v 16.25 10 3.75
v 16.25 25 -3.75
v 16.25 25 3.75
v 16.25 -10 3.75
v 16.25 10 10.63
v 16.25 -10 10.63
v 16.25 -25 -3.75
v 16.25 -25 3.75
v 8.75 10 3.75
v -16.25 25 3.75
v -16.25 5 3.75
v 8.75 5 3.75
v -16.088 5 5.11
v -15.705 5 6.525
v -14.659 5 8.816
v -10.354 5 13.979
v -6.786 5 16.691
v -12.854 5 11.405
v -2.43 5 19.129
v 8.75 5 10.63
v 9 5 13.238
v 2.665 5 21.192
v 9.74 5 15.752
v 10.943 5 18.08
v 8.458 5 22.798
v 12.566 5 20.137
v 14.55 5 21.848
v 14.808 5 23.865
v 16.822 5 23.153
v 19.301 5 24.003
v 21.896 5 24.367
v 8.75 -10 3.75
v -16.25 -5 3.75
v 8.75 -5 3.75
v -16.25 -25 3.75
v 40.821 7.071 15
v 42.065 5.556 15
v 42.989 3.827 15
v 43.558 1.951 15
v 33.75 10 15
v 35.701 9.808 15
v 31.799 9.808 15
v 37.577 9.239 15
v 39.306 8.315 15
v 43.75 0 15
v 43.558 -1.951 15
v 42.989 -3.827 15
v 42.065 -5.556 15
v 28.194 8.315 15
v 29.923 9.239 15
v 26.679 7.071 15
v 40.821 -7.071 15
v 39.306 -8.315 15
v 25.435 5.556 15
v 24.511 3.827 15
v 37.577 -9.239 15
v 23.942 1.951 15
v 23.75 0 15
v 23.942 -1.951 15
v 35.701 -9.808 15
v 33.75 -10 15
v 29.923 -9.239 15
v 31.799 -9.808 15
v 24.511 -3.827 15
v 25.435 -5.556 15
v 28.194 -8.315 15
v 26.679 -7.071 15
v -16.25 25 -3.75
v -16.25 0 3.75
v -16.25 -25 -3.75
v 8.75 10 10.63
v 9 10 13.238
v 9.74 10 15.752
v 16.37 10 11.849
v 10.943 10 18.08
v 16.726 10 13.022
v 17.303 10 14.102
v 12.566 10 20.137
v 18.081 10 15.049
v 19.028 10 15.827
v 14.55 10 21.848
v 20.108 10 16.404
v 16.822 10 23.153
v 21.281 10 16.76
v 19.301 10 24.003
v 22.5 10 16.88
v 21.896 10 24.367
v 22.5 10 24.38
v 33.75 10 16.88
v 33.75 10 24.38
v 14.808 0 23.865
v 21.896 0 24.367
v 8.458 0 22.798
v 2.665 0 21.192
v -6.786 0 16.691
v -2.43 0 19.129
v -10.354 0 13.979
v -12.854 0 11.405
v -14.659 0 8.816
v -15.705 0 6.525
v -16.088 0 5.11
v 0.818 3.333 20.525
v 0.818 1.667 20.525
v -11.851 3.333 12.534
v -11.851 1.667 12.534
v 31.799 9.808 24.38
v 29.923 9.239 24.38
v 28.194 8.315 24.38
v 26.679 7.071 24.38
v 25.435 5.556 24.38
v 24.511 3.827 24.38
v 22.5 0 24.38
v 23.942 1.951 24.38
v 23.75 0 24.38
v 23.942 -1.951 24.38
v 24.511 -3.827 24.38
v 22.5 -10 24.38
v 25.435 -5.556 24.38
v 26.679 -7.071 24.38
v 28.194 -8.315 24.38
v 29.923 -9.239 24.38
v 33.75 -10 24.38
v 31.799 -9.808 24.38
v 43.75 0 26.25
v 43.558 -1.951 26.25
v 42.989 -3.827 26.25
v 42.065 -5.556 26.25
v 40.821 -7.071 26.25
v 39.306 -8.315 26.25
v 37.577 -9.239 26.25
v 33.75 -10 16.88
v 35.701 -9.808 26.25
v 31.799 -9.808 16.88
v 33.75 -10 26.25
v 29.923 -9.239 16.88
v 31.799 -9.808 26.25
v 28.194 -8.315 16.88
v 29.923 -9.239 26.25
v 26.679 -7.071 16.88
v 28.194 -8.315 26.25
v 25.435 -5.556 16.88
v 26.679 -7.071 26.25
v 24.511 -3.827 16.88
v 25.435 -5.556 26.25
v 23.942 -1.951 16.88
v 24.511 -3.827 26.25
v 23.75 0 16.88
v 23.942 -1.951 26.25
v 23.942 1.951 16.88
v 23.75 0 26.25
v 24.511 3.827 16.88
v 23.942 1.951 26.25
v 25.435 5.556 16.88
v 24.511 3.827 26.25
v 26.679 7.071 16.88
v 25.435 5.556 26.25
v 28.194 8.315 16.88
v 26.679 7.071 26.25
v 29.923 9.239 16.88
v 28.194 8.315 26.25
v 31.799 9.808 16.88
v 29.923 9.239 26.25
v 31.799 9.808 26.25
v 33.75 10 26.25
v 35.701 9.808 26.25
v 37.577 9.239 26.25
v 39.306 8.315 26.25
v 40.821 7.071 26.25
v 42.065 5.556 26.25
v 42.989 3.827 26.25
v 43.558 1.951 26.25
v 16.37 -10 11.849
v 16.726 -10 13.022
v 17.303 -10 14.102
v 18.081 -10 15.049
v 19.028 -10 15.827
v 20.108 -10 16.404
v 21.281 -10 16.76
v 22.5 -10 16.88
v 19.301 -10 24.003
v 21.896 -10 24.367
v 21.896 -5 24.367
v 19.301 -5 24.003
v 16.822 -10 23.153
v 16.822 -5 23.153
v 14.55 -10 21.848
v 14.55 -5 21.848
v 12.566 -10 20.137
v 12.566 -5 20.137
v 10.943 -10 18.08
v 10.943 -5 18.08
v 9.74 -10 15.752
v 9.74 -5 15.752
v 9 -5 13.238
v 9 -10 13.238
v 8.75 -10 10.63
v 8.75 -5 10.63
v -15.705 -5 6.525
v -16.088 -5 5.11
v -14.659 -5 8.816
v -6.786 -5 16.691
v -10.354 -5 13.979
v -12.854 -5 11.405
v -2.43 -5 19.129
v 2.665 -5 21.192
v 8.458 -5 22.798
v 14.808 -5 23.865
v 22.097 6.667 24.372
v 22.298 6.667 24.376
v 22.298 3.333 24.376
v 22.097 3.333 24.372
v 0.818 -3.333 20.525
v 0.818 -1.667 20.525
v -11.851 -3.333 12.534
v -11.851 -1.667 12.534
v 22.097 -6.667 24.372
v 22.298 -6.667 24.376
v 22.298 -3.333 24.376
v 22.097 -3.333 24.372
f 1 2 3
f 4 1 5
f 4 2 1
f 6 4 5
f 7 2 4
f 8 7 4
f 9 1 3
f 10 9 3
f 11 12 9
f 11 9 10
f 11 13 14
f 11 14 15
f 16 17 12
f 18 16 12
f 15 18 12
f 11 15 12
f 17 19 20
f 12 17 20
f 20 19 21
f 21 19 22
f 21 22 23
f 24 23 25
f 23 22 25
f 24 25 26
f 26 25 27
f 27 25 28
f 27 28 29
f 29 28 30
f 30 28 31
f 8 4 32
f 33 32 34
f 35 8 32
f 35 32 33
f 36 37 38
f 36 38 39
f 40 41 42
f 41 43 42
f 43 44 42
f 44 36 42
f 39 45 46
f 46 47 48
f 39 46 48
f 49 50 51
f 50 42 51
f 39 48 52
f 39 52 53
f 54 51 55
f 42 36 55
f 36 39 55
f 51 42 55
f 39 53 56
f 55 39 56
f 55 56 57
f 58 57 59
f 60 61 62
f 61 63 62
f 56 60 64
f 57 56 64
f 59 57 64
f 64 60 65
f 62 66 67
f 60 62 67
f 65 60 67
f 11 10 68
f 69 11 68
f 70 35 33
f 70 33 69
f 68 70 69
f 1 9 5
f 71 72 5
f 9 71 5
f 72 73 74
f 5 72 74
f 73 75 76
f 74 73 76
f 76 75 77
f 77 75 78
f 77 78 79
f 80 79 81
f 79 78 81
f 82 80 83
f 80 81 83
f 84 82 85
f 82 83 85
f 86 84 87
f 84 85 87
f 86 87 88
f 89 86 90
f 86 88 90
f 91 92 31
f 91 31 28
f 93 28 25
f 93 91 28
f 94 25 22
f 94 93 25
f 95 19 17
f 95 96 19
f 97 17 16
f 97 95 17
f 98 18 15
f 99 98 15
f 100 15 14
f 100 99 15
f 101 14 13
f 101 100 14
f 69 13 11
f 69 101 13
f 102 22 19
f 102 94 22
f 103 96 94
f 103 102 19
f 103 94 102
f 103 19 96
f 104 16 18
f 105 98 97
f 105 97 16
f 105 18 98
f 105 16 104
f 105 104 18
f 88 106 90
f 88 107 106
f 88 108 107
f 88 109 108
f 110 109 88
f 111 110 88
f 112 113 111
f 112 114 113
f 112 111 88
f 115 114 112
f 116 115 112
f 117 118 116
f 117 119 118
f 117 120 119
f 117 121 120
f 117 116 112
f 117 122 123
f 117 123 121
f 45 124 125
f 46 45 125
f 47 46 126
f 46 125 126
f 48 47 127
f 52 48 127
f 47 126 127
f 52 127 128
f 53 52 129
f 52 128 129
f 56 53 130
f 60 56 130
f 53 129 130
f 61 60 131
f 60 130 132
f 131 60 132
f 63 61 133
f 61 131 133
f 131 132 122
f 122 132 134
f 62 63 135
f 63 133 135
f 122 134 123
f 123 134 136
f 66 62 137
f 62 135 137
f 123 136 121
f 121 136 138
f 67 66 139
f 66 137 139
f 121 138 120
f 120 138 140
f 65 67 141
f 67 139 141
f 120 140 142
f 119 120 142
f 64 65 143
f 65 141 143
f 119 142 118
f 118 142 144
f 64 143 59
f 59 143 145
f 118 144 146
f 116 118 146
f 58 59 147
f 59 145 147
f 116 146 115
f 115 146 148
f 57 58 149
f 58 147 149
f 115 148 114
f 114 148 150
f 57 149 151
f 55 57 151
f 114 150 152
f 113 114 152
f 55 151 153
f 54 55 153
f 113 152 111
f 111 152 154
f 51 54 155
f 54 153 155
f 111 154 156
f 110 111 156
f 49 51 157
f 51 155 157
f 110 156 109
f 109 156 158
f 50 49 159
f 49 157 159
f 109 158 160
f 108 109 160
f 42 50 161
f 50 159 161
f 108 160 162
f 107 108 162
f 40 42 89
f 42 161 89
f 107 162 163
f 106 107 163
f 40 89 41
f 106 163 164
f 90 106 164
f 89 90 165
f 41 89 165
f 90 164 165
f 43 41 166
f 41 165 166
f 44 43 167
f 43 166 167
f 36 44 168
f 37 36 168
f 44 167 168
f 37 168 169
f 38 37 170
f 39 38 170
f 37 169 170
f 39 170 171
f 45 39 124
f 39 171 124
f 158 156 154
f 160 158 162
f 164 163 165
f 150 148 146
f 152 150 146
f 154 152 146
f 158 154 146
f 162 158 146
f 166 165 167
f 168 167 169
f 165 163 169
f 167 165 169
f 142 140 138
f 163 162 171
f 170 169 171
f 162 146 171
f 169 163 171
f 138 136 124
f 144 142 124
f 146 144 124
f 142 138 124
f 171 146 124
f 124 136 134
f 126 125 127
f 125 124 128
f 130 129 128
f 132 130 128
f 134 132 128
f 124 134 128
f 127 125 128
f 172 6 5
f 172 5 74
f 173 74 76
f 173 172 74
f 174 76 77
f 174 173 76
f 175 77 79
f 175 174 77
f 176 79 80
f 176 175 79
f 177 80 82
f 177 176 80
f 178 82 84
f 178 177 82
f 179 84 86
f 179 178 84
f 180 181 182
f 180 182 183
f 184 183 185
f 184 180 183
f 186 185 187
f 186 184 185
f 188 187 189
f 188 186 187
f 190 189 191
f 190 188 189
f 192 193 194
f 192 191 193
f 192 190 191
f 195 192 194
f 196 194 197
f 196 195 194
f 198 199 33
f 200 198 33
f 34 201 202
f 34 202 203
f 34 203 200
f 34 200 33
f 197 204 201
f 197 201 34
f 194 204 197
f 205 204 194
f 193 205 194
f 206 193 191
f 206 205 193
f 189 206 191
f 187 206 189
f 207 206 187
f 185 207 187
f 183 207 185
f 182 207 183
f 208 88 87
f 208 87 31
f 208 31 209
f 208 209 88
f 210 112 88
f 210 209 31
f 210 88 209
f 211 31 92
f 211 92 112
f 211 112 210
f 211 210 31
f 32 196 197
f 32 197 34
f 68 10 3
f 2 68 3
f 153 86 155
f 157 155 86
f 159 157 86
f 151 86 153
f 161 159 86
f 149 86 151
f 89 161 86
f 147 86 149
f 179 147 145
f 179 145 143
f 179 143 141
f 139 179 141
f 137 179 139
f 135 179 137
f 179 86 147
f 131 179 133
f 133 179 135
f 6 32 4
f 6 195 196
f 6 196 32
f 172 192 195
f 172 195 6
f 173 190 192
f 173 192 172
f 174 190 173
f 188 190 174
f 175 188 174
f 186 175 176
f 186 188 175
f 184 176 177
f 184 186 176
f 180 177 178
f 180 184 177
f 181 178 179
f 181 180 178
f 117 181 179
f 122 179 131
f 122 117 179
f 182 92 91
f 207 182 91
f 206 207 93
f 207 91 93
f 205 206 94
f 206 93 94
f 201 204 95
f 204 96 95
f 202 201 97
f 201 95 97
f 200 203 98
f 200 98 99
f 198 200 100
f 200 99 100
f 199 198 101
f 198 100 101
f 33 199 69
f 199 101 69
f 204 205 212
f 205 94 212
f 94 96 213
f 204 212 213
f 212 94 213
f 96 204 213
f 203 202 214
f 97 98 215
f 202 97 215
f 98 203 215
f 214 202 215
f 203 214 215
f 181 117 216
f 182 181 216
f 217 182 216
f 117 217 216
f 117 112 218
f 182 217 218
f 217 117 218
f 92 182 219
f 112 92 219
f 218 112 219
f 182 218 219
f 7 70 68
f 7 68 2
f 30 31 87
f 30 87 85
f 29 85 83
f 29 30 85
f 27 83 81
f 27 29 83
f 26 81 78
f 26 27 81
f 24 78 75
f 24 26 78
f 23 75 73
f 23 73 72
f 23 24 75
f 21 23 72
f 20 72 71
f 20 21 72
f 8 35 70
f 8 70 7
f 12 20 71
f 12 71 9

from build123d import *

# Parameters (mm, degrees)
F1_DEPTH = 25
F2_DEPTH = 5
F0_W     = 10
F0_H     = 7.5000003082
F3_DEPTH = 10


with BuildPart() as f1:
    # F0 (on Front) → F1 (new body, symmetric)
    with BuildSketch(Plane.XZ):
        Polygon((-16.25, 3.75), (-16.25, -3.75), (16.25, -3.75), (16.25, 3.75), (8.7499996918, 3.75), align=None)
    extrude(amount=F1_DEPTH, both=True)

    # F0 (on Front) → F2 (join, symmetric)
    with BuildSketch(Plane.XZ):
        with BuildLine():
            add(Edge.make_bspline(
                [(21.8955707276, 24.3667089847), (-3.4341610337, 23.7179701403), (-15.9380340583, 11.8111578561), (-16.25, 3.75)],
                knots=[0.3450535136, 0.3450535136, 0.3450535136, 0.3450535136, 43.8994238312, 43.8994238312, 43.8994238312, 43.8994238312], degree=3))
            Line((-16.25, 3.75), (8.7499996918, 3.75))
            Line((8.7499996918, 3.75), (8.7499996918, 10.63))
            ThreePointArc((8.7499996918, 10.63), (12.5658817413, 20.1366188993), (21.8955707276, 24.3667089847))
        make_face()
    extrude(amount=F2_DEPTH, both=True)

    # F0 (on Front) → F3 (join, symmetric)
    with BuildSketch(Plane.XZ):
        with BuildLine():
            Line((8.7499996918, 3.75), (16.25, 3.75))
            Line((16.25, 3.75), (16.25, 10.63))
            ThreePointArc((16.25, 10.63), (18.0805826176, 15.0494173824), (22.5, 16.88))
            Line((22.5, 16.88), (23.75, 16.88))
            Line((23.75, 16.88), (23.75, 24.3800003082))
            Line((23.75, 24.3800003082), (22.5, 24.3800003082))
            add(Edge.make_bspline(
                [(22.5, 24.3800003082), (22.2977183657, 24.3762814735), (22.0962420467, 24.371848529), (21.8955707276, 24.3667089847)],
                knots=[0, 0, 0, 0, 0.3450535136, 0.3450535136, 0.3450535136, 0.3450535136], degree=3))
            ThreePointArc((21.8955707276, 24.3667089847), (12.5658817413, 20.1366188993), (8.7499996918, 10.63))
            Line((8.7499996918, 10.63), (8.7499996918, 3.75))
        make_face()
        with Locations((28.75, 20.6300001541)):
            Rectangle(F0_W, F0_H)
    extrude(amount=F3_DEPTH, both=True)

    # F0 (on Front) → F4 (revolve)
    with BuildSketch(Plane.XZ):
        Polygon((33.75, 26.25), (33.75, 24.3800003082), (33.75, 16.88), (33.75, 15), (43.75, 15), (43.75, 26.25), align=None)
    revolve(axis=Axis((33.75, 0, 20.625), (0, 0, -1)))


solid = f1.part
